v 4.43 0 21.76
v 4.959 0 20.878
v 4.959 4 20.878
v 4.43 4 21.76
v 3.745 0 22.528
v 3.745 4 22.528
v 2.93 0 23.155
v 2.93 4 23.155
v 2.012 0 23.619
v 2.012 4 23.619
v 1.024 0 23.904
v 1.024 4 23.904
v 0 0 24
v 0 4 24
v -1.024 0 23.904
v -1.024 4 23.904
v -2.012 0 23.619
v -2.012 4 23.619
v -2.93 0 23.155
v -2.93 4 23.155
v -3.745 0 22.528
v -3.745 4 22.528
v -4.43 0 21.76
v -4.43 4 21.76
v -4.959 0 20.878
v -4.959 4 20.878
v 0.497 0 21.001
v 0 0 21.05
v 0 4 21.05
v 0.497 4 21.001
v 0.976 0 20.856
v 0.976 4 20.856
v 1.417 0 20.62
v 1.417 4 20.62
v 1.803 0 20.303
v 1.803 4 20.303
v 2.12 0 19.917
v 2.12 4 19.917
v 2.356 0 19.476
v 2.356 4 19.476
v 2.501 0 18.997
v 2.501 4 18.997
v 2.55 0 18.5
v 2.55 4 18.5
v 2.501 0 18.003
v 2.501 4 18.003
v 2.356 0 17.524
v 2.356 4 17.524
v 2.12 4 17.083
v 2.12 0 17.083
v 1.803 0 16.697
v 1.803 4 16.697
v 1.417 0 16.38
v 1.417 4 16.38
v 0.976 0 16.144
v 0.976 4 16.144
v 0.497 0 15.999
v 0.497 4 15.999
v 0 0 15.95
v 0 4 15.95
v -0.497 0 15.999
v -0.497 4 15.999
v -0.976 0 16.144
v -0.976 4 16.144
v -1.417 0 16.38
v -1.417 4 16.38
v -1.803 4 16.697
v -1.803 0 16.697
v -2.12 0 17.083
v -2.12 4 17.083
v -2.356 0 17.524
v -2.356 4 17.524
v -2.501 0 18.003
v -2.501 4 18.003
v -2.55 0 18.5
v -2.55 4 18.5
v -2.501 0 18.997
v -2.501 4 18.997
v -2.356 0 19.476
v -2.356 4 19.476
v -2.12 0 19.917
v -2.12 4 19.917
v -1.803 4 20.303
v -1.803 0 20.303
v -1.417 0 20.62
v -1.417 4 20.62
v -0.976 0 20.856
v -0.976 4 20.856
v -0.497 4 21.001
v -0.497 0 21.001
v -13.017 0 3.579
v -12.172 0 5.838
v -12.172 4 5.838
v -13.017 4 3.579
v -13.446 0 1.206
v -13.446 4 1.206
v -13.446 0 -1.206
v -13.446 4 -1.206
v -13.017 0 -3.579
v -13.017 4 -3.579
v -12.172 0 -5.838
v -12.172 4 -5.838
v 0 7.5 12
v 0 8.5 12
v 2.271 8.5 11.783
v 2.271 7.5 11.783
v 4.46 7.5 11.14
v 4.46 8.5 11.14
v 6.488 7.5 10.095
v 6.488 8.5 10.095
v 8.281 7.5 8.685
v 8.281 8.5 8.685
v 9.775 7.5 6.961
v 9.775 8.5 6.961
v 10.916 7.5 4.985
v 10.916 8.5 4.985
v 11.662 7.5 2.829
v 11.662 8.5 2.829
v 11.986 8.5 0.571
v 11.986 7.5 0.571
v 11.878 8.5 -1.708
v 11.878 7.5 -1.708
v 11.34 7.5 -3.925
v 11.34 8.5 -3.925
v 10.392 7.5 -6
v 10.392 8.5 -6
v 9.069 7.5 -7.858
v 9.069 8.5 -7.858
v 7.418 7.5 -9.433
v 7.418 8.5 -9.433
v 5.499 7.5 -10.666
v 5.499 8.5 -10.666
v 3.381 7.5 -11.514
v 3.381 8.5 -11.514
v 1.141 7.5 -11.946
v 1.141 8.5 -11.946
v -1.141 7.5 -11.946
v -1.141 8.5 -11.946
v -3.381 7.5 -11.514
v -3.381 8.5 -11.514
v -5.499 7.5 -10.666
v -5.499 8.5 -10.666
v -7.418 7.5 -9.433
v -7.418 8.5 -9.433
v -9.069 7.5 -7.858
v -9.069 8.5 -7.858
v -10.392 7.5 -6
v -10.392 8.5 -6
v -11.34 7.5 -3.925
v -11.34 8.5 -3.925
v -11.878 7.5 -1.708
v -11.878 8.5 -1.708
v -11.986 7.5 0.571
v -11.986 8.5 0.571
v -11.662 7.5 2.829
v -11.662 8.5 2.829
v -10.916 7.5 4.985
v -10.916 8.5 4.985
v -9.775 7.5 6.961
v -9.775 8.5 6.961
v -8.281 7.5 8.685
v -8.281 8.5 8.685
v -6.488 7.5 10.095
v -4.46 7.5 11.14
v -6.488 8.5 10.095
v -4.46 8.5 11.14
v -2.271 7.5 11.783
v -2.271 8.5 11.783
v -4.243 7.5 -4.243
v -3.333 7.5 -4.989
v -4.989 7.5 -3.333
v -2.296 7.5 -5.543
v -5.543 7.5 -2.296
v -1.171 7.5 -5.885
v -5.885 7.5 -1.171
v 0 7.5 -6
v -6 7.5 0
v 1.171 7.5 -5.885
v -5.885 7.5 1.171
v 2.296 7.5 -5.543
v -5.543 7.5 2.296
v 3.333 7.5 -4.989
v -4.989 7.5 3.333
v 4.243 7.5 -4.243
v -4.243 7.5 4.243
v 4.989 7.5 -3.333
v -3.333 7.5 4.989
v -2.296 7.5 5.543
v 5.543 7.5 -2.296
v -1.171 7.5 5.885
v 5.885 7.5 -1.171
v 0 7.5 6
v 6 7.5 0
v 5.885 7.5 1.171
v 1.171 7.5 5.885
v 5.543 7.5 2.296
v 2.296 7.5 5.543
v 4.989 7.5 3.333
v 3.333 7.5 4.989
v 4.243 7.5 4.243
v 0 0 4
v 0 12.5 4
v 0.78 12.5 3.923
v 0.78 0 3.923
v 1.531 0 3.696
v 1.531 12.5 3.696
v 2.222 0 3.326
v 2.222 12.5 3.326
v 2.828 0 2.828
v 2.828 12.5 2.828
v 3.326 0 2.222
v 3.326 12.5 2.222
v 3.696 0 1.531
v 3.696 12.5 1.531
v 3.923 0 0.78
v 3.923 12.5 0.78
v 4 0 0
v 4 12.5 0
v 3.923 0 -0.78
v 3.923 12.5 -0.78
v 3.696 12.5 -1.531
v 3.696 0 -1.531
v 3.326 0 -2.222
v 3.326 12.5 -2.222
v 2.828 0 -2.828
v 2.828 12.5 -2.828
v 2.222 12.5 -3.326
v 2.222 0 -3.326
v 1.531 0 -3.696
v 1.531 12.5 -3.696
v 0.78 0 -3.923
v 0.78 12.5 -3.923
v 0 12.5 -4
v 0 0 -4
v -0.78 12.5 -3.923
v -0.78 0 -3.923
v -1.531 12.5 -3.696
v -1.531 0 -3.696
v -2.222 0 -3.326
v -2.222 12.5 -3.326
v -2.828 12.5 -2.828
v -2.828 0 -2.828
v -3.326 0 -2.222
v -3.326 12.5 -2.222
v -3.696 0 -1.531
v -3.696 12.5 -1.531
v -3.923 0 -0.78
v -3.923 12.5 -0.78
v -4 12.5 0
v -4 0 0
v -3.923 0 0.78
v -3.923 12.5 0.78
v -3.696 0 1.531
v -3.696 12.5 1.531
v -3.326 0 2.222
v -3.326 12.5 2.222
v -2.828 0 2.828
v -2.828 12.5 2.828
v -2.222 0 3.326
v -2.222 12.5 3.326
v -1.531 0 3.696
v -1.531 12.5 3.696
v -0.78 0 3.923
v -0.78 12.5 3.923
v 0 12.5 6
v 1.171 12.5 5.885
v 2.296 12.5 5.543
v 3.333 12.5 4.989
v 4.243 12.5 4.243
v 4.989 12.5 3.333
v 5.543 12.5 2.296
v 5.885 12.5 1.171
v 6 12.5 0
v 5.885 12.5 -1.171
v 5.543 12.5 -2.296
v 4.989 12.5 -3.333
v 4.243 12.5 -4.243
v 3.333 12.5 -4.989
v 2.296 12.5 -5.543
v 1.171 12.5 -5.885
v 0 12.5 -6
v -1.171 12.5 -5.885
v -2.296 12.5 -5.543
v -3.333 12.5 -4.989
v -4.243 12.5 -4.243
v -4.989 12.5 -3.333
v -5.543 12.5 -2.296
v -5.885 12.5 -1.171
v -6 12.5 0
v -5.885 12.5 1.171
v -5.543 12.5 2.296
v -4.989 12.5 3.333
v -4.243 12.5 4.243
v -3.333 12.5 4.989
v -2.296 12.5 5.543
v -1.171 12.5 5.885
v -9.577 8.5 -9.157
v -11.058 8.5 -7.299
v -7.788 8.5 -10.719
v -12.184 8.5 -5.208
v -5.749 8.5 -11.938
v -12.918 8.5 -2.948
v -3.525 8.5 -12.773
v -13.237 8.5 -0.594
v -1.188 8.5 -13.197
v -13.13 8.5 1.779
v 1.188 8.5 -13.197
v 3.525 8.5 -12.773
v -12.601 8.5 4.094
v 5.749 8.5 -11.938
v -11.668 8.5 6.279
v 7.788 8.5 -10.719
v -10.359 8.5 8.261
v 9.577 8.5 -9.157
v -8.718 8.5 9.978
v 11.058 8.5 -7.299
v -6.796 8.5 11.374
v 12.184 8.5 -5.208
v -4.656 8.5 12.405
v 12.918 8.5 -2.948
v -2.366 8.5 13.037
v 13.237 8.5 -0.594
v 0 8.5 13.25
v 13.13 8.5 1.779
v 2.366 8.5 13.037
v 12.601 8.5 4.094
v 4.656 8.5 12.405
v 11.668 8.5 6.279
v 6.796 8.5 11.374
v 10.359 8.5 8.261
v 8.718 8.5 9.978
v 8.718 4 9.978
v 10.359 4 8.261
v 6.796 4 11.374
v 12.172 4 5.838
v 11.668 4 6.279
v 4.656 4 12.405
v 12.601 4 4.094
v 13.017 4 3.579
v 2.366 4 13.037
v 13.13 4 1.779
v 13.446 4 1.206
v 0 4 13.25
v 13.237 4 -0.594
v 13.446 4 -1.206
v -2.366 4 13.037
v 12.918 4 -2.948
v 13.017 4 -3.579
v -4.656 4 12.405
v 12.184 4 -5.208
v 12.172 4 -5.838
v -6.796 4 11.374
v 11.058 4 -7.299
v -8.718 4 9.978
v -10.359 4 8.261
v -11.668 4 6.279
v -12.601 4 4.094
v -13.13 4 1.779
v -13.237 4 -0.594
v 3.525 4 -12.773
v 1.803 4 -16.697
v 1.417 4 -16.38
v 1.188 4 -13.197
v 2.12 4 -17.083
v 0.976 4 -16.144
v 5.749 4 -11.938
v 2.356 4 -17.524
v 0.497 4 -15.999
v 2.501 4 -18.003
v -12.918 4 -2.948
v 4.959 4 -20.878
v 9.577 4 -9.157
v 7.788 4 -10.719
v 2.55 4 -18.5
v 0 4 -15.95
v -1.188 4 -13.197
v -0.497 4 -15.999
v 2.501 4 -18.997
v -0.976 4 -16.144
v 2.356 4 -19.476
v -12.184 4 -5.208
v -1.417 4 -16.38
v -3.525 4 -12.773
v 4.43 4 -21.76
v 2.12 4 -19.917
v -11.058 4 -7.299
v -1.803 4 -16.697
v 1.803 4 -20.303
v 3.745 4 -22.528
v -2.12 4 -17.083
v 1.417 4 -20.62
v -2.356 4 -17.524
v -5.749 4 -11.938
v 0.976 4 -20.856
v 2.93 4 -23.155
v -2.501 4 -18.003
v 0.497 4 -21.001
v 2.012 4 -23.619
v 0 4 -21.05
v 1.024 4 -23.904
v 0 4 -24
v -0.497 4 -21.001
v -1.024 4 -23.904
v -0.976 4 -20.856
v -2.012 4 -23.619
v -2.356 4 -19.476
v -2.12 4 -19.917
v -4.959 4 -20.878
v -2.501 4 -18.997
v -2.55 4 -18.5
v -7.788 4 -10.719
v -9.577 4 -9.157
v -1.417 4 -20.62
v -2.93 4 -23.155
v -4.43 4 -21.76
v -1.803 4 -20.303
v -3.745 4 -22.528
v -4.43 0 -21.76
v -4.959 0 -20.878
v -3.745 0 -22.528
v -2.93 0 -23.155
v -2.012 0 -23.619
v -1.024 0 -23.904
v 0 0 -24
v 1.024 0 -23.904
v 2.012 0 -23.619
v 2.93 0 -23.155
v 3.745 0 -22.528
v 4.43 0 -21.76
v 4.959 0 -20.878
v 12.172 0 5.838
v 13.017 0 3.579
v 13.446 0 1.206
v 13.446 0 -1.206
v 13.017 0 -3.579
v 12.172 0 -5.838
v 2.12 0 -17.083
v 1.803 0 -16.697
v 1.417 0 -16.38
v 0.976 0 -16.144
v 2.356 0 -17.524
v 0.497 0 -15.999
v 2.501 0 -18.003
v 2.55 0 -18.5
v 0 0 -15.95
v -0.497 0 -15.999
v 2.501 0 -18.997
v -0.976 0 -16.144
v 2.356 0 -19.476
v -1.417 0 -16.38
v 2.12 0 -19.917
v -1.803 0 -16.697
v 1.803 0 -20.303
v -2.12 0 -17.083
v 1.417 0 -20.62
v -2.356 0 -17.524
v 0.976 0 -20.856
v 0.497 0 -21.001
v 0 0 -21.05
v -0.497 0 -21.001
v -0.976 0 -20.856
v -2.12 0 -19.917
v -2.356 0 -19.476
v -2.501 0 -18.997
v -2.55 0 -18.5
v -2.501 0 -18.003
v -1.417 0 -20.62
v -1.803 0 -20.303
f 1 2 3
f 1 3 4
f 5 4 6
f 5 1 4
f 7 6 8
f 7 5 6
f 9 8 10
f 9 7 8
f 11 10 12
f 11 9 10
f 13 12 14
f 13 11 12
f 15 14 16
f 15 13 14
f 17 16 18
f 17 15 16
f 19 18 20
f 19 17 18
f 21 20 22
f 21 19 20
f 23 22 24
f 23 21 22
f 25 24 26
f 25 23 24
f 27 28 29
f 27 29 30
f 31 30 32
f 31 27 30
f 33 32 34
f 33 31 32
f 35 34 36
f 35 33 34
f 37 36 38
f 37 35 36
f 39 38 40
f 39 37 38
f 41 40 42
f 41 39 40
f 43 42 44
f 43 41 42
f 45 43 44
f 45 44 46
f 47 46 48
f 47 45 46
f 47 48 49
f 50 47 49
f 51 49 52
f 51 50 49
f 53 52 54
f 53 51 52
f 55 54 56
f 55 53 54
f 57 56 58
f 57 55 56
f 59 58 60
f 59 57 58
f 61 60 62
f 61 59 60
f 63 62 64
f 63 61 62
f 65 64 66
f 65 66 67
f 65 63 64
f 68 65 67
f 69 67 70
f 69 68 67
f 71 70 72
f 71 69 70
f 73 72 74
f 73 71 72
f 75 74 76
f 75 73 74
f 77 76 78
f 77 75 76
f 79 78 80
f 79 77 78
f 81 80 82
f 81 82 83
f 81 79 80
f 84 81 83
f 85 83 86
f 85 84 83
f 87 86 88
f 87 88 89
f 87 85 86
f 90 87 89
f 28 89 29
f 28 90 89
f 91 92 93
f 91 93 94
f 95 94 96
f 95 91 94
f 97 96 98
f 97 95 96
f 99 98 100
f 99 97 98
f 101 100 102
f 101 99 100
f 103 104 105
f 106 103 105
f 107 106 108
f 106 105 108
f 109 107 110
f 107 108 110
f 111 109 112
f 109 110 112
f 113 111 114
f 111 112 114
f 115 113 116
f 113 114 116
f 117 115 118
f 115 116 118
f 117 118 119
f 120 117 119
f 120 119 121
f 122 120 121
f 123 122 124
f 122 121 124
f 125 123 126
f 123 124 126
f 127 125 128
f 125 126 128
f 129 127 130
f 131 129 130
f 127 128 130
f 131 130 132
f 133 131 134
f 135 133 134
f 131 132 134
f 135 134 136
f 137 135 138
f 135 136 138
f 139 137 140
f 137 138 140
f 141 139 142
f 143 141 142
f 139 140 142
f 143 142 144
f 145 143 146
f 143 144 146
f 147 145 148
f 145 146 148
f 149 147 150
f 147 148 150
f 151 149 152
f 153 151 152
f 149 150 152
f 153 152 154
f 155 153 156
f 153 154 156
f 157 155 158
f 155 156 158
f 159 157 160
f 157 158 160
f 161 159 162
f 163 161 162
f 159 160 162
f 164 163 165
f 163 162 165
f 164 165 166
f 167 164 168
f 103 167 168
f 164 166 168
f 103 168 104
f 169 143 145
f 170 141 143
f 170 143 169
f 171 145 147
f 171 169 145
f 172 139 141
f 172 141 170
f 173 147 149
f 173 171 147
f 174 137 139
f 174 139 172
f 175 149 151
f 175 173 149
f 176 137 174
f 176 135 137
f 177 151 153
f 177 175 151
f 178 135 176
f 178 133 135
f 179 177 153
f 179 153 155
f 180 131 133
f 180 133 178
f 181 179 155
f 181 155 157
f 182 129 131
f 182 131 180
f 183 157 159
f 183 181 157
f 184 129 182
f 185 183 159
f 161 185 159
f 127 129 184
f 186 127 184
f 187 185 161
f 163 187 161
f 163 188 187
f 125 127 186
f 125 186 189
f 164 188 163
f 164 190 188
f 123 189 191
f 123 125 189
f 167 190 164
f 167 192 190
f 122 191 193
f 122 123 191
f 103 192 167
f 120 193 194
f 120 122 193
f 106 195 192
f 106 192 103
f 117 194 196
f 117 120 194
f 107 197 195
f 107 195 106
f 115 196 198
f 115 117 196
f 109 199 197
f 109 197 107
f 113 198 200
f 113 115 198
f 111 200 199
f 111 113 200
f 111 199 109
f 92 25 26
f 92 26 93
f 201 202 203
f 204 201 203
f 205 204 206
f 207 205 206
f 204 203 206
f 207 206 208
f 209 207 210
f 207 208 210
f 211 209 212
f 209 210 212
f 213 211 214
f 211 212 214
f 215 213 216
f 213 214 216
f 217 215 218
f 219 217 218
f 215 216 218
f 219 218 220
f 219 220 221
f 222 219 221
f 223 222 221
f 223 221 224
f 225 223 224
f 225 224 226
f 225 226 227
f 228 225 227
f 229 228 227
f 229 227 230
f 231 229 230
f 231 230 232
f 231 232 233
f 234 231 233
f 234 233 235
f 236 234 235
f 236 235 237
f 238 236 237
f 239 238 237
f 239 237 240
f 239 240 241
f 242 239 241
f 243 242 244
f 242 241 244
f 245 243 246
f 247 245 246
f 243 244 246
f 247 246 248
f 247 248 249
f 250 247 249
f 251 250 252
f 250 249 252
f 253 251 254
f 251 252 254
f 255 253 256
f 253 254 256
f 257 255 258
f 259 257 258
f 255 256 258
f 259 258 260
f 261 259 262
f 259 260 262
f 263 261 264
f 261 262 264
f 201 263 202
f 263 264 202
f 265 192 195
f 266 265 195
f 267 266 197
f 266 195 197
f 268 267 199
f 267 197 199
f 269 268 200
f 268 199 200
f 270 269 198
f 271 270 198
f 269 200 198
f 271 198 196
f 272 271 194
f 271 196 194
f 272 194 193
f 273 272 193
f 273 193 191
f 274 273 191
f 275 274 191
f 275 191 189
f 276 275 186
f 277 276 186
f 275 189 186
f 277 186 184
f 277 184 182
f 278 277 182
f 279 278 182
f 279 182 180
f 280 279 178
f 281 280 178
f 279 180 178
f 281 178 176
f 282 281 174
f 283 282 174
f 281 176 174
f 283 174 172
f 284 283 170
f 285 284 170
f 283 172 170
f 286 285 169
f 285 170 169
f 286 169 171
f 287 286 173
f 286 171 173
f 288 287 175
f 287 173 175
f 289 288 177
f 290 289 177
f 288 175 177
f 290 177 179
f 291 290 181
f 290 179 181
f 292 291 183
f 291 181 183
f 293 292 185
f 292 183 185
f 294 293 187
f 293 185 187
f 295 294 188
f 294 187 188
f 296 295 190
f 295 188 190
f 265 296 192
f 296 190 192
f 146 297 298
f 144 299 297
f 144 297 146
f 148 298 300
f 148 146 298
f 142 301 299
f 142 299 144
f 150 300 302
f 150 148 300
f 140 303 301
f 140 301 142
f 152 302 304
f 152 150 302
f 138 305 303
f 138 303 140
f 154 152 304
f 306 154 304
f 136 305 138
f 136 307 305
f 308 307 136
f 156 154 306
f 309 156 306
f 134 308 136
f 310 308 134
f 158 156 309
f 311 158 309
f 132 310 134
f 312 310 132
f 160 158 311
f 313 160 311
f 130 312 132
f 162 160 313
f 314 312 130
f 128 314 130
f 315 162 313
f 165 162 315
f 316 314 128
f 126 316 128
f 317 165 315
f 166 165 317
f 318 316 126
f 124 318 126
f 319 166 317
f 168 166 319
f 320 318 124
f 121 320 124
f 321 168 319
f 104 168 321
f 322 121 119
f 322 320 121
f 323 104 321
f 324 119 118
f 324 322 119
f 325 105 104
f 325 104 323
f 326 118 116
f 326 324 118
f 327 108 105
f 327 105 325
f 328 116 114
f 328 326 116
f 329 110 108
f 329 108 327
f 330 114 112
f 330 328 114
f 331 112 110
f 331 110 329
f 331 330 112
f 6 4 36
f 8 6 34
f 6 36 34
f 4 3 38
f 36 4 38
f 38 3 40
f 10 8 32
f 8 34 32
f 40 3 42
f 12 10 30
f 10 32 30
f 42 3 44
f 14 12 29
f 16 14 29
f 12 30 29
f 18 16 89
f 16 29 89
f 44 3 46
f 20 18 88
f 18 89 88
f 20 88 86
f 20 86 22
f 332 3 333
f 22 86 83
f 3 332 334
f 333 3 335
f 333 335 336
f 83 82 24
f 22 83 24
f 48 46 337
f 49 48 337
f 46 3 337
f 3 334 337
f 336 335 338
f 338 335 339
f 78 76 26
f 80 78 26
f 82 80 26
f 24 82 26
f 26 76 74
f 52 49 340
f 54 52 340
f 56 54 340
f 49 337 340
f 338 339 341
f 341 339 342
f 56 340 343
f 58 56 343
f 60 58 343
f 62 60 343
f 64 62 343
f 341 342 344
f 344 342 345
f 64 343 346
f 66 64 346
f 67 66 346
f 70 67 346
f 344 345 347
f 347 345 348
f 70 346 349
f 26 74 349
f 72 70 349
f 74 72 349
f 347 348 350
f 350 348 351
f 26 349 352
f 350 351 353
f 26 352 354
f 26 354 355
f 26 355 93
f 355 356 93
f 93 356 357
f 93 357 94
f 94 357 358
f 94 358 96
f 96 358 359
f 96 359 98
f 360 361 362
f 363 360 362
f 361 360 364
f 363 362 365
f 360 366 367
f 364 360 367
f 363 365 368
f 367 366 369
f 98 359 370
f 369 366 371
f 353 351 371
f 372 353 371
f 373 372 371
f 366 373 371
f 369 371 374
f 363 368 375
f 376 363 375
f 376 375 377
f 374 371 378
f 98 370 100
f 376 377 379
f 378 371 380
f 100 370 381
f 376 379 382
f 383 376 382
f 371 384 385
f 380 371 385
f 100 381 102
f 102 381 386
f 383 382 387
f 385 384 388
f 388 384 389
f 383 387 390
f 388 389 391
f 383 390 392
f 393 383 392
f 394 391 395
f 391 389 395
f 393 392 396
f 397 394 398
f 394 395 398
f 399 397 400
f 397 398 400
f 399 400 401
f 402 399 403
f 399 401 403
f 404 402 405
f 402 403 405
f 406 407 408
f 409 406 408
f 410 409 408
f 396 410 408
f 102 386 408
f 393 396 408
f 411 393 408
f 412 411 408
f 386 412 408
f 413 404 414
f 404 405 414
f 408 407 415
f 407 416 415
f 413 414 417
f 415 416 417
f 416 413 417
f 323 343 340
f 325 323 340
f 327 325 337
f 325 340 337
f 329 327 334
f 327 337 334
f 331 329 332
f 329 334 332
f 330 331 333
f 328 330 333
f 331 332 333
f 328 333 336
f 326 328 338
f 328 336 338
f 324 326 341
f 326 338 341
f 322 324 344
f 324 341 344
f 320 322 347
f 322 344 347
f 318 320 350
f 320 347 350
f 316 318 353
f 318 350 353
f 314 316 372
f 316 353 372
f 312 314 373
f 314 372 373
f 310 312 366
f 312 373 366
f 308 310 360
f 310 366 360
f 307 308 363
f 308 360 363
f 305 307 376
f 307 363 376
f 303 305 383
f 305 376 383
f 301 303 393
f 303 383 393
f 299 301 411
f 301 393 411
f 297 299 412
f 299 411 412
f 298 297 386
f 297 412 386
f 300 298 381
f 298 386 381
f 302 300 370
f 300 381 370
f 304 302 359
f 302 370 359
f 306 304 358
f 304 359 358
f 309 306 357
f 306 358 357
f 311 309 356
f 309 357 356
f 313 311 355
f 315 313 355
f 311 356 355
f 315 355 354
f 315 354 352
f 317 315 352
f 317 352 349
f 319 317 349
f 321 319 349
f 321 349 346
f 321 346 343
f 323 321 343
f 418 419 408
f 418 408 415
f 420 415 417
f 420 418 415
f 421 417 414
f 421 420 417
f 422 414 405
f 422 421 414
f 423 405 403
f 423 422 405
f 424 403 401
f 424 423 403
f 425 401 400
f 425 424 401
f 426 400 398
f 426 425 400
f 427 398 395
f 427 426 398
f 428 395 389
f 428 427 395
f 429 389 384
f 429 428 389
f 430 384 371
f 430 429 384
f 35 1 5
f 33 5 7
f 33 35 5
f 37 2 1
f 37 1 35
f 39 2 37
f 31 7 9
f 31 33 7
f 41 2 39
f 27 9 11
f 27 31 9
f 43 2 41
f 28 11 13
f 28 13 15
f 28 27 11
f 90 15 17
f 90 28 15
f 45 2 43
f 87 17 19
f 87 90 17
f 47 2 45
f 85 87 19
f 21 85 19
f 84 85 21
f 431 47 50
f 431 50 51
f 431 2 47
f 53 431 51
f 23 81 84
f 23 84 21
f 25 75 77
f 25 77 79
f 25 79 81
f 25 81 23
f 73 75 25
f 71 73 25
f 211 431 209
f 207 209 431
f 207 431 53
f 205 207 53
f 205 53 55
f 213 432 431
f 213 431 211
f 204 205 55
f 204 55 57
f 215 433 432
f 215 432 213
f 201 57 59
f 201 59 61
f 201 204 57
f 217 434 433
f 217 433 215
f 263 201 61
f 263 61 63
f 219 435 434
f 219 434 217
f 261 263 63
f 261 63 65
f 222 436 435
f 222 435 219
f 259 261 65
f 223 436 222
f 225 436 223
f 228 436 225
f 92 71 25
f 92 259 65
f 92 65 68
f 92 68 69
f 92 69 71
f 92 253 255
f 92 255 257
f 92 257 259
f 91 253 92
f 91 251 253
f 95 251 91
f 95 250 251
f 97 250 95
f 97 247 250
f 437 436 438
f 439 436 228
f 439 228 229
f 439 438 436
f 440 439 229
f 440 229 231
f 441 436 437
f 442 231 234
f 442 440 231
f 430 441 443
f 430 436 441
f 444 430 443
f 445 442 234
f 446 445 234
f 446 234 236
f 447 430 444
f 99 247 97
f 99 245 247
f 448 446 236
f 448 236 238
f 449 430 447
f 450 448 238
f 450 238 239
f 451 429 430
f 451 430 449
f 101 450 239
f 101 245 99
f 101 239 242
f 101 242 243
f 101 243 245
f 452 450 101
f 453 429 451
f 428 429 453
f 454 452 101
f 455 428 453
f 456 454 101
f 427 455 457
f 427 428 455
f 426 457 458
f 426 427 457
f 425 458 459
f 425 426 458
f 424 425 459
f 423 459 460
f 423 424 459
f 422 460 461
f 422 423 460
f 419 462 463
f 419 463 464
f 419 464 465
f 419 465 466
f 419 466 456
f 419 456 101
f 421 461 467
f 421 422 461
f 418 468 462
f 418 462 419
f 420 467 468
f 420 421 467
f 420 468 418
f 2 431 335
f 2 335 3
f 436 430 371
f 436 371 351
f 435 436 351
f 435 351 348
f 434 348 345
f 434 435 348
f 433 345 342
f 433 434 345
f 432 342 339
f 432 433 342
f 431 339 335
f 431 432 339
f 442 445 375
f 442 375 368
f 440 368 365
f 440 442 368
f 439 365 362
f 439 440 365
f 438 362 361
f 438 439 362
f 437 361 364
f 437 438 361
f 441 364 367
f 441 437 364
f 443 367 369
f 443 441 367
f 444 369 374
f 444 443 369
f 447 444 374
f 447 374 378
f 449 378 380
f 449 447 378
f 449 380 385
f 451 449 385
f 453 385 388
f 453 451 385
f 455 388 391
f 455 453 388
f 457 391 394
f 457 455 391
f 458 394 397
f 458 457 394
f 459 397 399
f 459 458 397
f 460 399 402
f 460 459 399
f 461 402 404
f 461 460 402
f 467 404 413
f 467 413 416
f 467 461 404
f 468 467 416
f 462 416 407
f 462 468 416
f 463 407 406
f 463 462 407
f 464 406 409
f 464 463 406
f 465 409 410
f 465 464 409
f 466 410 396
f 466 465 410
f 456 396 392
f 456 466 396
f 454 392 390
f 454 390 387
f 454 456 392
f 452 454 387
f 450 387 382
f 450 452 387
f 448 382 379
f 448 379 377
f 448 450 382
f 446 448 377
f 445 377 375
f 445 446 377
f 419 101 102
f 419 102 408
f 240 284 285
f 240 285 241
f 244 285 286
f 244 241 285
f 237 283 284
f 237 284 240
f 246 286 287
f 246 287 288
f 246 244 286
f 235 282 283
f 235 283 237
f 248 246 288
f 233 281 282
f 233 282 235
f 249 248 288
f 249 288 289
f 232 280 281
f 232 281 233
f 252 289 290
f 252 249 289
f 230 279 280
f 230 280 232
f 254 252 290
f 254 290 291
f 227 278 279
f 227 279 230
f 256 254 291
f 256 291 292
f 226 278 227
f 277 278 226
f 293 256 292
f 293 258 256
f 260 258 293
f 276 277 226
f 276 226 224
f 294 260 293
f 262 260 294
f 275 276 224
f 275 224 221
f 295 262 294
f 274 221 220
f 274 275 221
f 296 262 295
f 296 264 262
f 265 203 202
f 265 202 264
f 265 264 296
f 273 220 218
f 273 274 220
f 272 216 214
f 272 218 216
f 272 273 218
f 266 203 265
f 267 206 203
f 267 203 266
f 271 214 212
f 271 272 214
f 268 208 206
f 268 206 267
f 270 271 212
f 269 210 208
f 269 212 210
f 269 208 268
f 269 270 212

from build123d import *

# Parameters (mm, degrees)
SKETCH1_R           = 2.55
BOSS_EXTRUDE1_DEPTH = 4
SKETCH2_R           = 13.25
BOSS_EXTRUDE2_DEPTH = 4.5
SKETCH3_R           = 12
CUT_EXTRUDE1_DEPTH  = 1
SKETCH4_R           = 6
BOSS_EXTRUDE3_DEPTH = 5
SKETCH5_R           = 4
CUT_EXTRUDE2_DEPTH  = 31.24070105


with BuildPart() as part:
    # Sketch1 → Boss-Extrude1 (new body)
    with BuildSketch(Plane(origin=(0, 0, 0), x_dir=(1, 0, 0), z_dir=(0, 1, 0))):
        with BuildLine():
            Line((4.959164878, 20.878378378), (12.17249561, 5.837837838))
            ThreePointArc((12.17249561, 5.837837838), (13.5, 0), (12.17249561, -5.837837838))
            Line((12.17249561, -5.837837838), (4.959164878, -20.878378378))
            ThreePointArc((4.959164878, -20.878378378), (0, -24), (-4.959164878, -20.878378378))
            Line((-4.959164878, -20.878378378), (-12.17249561, -5.837837838))
            ThreePointArc((-12.17249561, -5.837837838), (-13.5, 0), (-12.17249561, 5.837837838))
            Line((-12.17249561, 5.837837838), (-4.959164878, 20.878378378))
            ThreePointArc((-4.959164878, 20.878378378), (0, 24), (4.959164878, 20.878378378))
        make_face()
        with Locations(Location((0, 18.5, 0), (0, 0, 270))):
            Circle(SKETCH1_R, mode=Mode.SUBTRACT)
        with Locations(Location((0, -18.5, 0), (0, 0, 270))):
            Circle(SKETCH1_R, mode=Mode.SUBTRACT)
    extrude(amount=BOSS_EXTRUDE1_DEPTH)

    # Sketch2 → Boss-Extrude2 (add)
    with BuildSketch(Plane(origin=(0, 4, 0), x_dir=(1, 0, 0), z_dir=(0, 1, 0))):
        with Locations(Location((0, 0, 0), (0, 0, 270))):
            Circle(SKETCH2_R)
    extrude(amount=BOSS_EXTRUDE2_DEPTH)

    # Sketch3 → Cut-Extrude1 (cut)
    with BuildSketch(Plane(origin=(0, 8.5, 0), x_dir=(1, 0, 0), z_dir=(0, 1, 0))):
        with Locations(Location((0, 0, 0), (0, 0, 270))):
            Circle(SKETCH3_R)
    extrude(amount=-CUT_EXTRUDE1_DEPTH, mode=Mode.SUBTRACT)

    # Sketch4 → Boss-Extrude3 (add)
    with BuildSketch(Plane(origin=(0, 7.5, 0), x_dir=(1, 0, 0), z_dir=(0, 1, 0))):
        with Locations(Location((0, 0, 0), (0, 0, 270))):
            Circle(SKETCH4_R)
    extrude(amount=BOSS_EXTRUDE3_DEPTH)

    # Sketch5 → Cut-Extrude2 (cut, through all)
    with BuildSketch(Plane(origin=(0, 12.5, 0), x_dir=(1, 0, 0), z_dir=(0, 1, 0))):
        with Locations(Location((0, 0, 0), (0, 0, 270))):
            Circle(SKETCH5_R)
    extrude(amount=-CUT_EXTRUDE2_DEPTH, mode=Mode.SUBTRACT)


solid = part.part
